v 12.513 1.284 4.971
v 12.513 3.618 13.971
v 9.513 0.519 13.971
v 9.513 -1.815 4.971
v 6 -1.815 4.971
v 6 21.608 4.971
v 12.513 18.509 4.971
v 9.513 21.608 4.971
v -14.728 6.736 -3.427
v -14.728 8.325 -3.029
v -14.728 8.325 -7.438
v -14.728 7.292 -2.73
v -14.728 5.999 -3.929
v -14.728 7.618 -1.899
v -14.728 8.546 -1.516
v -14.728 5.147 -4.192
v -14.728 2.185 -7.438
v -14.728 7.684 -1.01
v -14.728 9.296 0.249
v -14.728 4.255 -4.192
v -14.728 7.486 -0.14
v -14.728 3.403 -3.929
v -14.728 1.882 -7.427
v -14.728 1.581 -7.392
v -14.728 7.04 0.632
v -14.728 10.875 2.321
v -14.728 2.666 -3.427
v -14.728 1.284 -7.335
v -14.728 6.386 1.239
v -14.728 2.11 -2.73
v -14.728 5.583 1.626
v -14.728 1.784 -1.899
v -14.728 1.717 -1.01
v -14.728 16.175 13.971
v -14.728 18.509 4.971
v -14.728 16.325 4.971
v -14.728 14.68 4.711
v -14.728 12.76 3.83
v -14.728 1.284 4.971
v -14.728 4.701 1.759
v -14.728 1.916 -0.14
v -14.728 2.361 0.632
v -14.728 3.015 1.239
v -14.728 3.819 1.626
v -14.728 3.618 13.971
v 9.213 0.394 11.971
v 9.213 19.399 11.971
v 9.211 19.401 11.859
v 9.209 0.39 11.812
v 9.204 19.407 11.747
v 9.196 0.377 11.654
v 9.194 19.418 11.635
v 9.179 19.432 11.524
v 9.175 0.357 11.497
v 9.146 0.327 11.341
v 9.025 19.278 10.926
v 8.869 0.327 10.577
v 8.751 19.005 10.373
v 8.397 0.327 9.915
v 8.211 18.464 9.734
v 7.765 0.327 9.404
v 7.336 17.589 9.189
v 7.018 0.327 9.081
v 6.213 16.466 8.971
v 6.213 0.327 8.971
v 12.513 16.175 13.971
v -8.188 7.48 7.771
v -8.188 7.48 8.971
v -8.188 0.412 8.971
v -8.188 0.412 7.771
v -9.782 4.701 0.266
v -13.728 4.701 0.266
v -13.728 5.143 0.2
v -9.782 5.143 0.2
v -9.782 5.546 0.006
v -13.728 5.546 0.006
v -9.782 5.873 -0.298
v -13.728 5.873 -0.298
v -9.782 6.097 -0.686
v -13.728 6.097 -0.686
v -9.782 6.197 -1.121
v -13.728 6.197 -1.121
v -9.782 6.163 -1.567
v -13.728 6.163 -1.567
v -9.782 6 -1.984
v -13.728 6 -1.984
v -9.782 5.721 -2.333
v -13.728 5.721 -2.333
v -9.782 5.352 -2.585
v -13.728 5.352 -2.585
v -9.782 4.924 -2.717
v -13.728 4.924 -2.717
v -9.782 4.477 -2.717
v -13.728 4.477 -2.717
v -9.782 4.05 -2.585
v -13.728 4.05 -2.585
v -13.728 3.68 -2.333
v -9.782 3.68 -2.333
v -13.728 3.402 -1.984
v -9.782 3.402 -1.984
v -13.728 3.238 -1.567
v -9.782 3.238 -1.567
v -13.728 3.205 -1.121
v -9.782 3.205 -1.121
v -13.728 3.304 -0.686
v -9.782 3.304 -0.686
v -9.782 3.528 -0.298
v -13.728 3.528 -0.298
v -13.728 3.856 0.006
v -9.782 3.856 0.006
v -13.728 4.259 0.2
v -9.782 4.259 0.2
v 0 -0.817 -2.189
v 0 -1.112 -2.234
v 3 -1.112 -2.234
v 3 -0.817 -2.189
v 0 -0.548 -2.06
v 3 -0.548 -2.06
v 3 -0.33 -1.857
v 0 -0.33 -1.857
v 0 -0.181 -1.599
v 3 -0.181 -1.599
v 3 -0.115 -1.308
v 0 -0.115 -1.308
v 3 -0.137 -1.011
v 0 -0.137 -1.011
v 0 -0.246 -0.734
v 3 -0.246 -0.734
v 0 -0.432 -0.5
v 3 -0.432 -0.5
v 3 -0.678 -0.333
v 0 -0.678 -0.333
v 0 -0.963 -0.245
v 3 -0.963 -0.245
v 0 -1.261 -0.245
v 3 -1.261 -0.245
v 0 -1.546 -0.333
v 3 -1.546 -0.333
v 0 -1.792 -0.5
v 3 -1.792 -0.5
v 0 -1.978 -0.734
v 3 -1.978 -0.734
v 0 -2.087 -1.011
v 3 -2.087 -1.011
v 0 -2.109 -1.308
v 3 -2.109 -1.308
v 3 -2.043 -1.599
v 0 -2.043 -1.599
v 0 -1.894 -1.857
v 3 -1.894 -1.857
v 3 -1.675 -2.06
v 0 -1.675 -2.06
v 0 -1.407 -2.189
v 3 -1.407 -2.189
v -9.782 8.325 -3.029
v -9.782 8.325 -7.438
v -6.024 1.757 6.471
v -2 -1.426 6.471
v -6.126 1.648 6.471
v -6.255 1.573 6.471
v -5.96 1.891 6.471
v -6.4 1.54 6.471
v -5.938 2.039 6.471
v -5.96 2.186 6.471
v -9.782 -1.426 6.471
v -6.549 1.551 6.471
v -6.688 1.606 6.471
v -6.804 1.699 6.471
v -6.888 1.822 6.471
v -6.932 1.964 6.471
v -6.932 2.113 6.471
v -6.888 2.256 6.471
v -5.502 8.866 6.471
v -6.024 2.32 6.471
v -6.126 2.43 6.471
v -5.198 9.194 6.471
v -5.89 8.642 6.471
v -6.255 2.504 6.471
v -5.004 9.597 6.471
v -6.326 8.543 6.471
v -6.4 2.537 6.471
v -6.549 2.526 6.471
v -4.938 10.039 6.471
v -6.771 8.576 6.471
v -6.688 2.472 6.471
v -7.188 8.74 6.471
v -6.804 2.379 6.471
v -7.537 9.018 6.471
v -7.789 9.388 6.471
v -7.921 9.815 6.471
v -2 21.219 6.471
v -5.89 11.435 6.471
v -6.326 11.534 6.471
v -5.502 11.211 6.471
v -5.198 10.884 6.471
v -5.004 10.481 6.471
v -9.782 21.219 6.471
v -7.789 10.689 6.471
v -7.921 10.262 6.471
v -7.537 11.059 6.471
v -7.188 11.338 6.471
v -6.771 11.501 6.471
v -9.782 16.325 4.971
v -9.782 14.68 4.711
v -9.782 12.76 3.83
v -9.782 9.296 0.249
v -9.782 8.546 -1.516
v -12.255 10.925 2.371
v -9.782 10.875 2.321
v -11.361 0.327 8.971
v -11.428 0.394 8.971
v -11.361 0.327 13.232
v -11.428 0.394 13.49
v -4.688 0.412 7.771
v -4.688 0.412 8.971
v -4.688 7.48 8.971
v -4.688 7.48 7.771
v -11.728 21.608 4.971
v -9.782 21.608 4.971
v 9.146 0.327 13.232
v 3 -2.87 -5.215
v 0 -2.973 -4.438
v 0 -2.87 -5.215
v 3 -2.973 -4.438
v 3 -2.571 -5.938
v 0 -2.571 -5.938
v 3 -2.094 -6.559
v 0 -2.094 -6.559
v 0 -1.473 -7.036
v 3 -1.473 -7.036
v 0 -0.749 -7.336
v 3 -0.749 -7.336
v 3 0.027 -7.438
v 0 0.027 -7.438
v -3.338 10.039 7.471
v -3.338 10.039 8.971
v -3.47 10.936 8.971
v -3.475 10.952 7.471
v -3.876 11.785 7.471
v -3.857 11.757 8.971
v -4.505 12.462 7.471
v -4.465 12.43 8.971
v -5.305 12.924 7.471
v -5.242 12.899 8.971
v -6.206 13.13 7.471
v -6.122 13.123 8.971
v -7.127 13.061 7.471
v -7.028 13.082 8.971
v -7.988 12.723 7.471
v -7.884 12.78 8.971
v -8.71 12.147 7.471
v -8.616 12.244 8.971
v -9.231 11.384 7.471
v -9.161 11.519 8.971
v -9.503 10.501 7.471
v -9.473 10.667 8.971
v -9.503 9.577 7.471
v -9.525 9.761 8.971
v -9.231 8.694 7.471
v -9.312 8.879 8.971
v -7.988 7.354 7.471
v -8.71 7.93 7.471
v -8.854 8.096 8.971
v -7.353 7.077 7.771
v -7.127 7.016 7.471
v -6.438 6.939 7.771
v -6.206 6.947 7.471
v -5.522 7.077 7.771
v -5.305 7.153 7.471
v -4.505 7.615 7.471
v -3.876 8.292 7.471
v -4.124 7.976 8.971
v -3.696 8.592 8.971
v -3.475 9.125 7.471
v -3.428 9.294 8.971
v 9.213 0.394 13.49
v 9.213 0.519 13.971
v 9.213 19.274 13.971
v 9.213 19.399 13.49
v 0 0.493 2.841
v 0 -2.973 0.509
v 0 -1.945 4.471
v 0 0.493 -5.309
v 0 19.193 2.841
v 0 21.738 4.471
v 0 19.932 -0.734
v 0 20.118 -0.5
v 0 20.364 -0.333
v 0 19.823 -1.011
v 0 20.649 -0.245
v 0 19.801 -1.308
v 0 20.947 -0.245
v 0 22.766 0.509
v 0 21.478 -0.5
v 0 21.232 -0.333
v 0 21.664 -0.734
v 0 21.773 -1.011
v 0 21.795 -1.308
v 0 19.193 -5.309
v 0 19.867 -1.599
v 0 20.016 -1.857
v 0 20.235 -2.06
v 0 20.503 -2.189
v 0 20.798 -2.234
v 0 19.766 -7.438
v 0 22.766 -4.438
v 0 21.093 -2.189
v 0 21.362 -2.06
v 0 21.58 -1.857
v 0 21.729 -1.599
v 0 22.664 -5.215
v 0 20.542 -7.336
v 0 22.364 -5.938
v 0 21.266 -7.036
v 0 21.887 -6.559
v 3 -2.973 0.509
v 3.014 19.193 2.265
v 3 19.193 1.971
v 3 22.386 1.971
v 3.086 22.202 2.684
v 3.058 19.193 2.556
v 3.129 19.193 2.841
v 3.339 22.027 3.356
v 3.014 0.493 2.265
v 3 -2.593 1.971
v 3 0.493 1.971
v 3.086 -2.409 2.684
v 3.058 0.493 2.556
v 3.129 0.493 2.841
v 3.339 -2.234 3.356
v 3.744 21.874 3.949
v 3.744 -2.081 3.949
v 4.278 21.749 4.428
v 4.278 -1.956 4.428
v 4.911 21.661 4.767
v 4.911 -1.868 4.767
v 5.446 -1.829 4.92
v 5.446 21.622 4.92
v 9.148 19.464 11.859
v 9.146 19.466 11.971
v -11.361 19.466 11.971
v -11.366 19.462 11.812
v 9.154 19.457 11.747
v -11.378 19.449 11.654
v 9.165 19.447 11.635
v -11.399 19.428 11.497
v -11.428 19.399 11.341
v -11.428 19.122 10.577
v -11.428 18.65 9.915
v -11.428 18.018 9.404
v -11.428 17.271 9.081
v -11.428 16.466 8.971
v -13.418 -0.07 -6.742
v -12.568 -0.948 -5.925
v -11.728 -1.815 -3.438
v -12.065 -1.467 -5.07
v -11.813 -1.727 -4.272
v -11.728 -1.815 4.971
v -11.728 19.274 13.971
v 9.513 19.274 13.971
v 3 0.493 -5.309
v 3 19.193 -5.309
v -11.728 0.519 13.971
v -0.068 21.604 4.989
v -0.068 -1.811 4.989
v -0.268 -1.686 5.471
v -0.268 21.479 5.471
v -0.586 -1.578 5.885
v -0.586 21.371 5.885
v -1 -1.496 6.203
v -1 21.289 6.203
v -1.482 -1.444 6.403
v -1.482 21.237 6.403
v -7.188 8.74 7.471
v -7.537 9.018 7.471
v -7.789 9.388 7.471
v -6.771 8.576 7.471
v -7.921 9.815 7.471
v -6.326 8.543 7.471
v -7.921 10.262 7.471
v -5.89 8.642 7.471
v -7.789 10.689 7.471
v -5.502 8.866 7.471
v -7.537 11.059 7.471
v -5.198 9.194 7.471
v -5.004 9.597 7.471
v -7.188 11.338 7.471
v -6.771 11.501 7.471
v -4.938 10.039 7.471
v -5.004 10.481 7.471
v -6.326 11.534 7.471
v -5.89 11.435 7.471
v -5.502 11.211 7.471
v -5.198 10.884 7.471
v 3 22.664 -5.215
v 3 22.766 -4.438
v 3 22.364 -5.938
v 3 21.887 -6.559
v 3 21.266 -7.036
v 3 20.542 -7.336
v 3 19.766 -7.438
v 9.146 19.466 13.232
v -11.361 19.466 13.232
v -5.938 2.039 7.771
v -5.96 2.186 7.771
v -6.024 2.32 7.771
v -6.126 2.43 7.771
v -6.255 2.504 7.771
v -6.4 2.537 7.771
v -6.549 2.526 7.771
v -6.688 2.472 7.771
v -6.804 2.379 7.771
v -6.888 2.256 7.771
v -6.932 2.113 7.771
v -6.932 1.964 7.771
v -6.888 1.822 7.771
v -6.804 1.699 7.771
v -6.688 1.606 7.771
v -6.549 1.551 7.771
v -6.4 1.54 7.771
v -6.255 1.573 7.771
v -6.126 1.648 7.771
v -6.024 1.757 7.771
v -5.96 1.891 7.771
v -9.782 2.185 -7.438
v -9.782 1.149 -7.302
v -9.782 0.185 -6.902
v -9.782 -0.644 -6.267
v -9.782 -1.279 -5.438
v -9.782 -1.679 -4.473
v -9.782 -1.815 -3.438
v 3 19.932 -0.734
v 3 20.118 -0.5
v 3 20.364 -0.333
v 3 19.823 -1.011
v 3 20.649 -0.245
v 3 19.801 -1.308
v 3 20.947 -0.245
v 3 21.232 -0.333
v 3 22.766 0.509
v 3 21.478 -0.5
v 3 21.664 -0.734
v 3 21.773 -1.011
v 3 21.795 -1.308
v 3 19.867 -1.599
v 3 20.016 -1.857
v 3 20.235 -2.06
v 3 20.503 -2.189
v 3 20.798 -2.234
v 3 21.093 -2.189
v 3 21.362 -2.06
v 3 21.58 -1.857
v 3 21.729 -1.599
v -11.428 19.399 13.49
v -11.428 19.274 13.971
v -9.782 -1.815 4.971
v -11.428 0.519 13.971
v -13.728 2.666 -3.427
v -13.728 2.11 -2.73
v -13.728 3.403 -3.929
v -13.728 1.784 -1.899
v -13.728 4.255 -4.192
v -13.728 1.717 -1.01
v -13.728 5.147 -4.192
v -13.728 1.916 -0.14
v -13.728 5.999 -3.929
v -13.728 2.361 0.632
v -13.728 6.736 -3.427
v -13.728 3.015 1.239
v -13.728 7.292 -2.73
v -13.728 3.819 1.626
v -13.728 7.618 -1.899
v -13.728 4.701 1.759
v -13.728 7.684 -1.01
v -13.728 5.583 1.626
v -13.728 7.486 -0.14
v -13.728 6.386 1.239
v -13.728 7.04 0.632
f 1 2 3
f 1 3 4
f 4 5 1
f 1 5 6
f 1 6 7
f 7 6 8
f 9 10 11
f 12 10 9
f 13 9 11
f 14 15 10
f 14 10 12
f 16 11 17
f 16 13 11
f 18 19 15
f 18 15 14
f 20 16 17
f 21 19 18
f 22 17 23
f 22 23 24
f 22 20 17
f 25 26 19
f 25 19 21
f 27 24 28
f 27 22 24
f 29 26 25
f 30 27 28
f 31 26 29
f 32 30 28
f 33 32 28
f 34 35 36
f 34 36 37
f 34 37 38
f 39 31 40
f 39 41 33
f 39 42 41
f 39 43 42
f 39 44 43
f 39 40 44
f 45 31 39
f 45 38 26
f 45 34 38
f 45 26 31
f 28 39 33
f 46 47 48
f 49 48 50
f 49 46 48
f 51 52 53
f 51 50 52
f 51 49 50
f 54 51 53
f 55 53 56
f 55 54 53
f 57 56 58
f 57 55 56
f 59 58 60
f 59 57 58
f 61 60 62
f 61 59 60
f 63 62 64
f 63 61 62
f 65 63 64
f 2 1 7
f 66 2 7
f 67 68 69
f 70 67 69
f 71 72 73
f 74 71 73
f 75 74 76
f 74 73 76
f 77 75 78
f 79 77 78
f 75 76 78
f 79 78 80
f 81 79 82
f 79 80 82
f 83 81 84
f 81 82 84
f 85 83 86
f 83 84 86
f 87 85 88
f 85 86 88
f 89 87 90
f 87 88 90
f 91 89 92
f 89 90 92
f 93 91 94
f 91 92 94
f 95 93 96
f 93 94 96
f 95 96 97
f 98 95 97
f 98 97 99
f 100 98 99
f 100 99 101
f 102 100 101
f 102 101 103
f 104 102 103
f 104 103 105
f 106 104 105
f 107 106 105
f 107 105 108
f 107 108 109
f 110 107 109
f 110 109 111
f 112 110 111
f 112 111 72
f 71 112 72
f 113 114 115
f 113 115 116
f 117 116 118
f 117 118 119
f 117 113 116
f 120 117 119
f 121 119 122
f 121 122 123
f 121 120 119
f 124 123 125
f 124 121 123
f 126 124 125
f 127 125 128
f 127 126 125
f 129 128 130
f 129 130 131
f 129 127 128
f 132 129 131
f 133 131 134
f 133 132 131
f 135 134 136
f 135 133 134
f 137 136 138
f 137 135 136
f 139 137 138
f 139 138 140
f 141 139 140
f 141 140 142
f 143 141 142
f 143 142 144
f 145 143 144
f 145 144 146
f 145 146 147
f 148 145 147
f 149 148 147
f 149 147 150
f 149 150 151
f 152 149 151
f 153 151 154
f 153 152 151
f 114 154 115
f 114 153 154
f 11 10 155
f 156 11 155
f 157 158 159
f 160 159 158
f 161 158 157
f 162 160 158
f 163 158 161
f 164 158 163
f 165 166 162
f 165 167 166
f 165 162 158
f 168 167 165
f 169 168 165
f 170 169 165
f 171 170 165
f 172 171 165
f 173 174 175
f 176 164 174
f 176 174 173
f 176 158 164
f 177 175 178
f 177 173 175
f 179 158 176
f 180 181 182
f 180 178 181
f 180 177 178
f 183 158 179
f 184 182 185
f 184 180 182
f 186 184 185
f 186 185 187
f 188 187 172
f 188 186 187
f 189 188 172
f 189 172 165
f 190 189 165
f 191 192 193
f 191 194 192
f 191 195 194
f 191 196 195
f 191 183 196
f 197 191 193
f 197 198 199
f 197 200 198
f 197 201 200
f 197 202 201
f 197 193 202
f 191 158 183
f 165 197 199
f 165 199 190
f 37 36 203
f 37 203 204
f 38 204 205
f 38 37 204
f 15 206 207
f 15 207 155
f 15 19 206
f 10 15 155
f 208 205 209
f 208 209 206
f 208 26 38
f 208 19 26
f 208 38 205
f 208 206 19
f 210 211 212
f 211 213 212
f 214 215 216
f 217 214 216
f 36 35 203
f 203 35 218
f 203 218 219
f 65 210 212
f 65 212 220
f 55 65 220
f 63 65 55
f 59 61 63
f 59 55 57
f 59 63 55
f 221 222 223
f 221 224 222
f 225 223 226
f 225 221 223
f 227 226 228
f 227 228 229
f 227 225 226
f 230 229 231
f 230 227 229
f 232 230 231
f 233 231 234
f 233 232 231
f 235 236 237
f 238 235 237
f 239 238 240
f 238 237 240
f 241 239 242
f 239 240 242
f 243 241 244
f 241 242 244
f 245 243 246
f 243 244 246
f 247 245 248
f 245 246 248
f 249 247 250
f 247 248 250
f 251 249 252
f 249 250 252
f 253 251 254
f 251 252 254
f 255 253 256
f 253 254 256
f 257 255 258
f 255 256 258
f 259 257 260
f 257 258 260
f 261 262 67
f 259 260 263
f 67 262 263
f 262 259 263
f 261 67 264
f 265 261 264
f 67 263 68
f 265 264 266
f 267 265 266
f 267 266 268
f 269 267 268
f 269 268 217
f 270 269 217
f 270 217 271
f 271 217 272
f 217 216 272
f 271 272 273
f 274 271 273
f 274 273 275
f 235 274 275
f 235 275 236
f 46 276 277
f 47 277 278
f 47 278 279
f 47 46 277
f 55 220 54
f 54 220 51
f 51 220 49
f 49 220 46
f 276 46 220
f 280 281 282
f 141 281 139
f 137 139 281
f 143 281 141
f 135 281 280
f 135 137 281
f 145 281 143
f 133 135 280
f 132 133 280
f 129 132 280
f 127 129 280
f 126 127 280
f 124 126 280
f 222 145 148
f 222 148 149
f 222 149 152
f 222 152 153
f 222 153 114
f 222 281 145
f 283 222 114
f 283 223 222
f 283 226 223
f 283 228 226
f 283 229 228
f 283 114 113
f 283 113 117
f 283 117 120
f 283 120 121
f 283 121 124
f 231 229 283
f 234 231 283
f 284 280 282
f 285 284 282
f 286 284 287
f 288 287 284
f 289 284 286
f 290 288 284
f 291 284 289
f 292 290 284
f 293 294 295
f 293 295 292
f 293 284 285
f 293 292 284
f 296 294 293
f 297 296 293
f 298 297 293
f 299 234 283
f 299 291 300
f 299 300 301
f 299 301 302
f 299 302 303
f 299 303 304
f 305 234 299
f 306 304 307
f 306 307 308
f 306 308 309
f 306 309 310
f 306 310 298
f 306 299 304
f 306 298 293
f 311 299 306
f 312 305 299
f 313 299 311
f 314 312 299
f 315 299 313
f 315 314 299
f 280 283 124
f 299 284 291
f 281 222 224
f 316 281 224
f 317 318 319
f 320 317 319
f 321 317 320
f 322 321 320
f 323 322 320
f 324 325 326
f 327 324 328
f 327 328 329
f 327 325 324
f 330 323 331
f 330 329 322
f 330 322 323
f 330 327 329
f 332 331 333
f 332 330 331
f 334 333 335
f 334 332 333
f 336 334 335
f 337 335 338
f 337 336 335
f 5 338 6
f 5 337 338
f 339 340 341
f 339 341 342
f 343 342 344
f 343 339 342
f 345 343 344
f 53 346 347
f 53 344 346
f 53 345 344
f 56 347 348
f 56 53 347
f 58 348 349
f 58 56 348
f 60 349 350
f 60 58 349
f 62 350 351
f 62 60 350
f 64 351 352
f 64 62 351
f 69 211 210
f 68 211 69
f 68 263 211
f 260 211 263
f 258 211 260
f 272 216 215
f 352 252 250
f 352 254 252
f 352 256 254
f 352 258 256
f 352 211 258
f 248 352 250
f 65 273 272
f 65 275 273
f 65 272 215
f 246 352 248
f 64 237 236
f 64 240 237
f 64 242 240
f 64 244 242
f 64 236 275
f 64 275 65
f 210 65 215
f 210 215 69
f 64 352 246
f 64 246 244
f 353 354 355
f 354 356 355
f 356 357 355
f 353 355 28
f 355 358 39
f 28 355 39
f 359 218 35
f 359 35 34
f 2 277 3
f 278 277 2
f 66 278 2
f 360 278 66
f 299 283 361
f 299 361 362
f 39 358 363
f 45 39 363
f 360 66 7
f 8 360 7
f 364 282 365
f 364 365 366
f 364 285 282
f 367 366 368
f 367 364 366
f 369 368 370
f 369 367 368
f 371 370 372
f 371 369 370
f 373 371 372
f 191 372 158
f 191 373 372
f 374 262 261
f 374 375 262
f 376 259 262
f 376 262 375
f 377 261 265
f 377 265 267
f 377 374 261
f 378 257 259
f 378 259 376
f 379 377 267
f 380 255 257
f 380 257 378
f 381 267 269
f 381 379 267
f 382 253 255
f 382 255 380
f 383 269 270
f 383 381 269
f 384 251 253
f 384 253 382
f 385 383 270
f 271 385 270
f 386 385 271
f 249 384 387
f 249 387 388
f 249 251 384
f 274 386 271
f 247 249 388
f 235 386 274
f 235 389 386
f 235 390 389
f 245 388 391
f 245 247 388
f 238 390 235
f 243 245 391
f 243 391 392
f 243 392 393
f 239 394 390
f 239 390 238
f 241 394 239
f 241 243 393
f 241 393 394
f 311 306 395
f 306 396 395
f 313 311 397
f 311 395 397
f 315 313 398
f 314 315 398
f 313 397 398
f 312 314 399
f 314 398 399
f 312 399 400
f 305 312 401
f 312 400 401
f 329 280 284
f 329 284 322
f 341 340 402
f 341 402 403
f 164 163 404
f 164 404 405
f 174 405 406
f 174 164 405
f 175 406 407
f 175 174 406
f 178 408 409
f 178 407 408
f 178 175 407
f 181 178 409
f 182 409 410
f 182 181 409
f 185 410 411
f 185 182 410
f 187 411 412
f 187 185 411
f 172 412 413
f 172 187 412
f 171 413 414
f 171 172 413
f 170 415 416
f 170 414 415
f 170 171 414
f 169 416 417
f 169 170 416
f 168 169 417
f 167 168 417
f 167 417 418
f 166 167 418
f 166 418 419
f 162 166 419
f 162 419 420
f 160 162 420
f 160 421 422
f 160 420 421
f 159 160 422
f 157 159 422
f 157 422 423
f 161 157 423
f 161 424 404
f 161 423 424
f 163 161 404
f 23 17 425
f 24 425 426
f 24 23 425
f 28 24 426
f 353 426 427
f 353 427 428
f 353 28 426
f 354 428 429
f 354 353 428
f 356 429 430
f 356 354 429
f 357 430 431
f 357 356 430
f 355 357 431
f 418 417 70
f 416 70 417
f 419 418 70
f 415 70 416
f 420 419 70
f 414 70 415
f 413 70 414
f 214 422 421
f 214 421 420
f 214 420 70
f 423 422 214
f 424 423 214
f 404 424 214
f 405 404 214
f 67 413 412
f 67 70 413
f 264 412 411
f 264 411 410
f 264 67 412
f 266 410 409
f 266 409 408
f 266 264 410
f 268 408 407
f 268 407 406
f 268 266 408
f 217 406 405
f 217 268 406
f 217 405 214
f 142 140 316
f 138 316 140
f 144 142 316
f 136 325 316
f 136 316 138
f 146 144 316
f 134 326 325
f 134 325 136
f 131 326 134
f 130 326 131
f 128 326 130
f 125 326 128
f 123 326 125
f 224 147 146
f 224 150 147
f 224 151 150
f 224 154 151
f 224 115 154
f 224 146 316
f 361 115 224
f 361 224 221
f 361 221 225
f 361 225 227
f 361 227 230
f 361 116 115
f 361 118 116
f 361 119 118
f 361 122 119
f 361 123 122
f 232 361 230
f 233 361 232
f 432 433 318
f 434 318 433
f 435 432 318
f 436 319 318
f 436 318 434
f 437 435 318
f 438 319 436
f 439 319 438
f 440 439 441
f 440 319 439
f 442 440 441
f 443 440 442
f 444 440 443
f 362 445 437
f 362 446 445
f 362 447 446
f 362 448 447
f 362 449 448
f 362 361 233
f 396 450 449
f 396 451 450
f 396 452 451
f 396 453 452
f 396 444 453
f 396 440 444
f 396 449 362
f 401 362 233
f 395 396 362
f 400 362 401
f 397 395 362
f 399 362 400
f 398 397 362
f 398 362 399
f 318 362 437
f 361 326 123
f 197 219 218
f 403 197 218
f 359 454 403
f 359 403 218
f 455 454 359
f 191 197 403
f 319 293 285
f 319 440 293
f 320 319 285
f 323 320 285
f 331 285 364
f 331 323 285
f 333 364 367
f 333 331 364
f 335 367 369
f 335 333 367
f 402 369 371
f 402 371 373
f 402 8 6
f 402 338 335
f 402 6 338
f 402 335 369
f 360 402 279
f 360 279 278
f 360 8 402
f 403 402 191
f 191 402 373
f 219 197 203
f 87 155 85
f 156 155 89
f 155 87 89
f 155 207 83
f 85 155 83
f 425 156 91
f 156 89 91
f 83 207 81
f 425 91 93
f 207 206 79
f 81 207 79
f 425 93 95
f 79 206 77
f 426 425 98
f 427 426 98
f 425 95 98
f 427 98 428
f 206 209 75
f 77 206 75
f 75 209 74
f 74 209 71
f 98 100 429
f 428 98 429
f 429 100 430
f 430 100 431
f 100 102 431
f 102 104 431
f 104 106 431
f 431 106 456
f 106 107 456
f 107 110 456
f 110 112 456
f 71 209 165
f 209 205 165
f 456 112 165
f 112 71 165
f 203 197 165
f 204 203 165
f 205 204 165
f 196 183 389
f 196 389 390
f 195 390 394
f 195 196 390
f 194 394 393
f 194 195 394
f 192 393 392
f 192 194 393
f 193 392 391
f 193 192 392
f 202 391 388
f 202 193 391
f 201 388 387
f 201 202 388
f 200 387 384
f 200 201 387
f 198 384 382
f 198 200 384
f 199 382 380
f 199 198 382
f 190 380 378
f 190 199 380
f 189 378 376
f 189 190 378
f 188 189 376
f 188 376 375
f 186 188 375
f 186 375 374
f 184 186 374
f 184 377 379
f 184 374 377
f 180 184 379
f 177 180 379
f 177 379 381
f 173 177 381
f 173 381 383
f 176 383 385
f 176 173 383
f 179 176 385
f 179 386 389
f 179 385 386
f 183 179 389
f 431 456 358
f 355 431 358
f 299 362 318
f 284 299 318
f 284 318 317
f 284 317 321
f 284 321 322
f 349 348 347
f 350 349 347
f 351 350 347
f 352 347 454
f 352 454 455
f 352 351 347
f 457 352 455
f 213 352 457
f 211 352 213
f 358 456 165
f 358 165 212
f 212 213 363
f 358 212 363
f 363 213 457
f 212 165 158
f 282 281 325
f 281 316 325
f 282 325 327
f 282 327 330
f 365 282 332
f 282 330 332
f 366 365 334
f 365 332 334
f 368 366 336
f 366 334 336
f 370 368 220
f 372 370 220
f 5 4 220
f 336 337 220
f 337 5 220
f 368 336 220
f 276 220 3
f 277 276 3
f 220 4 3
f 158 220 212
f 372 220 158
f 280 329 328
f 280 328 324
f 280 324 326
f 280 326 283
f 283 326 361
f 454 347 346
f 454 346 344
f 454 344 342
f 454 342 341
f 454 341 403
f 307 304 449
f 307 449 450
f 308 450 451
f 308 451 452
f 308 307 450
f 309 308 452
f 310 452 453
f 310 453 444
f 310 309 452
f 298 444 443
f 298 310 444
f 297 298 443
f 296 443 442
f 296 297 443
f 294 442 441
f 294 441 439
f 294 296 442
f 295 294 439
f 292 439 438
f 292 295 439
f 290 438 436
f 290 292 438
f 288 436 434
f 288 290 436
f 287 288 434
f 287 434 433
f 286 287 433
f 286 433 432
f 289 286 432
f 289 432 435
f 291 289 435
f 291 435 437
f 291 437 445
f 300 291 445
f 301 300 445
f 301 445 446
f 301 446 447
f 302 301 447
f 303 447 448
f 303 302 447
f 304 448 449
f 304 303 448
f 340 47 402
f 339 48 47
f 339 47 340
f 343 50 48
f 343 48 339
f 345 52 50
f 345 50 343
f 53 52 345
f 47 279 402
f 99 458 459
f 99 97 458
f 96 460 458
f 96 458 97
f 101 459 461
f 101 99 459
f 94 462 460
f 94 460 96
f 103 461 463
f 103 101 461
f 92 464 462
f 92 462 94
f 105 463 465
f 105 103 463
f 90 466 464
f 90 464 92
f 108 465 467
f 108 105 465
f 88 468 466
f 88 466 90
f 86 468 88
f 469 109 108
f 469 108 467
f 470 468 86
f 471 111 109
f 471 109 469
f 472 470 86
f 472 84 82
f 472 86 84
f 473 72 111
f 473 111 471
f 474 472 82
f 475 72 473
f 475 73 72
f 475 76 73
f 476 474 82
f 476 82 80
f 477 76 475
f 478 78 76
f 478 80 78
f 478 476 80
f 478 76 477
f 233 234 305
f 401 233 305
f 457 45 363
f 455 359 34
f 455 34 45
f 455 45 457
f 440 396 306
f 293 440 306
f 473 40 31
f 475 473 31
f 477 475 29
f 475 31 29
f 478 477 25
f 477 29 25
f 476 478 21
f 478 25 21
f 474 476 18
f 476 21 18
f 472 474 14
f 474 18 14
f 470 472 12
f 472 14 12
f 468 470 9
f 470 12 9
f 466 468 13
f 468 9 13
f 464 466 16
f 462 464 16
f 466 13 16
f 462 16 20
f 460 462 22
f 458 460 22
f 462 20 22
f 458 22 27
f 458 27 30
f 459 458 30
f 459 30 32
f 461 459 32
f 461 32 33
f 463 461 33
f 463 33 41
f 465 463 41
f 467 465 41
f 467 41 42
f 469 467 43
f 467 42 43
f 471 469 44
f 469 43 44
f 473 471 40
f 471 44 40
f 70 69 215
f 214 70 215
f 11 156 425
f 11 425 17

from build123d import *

# Parameters (mm, degrees)
SKETCH1_W                = 12.409227922
SKETCH1_H                = 25.738488059
SKETCH1_R                = 1
SKETCH1_W_2              = 8.15
SKETCH1_H_2              = 18.7
BOSS_EXTRUDE1_DEPTH      = 3
SKETCH15_W               = 27.240995133
SKETCH15_H               = 25.738488059
BOSS_EXTRUDE5_DEPTH      = 4
SKETCH16_R               = 3.1
CUT_EXTRUDE12_DEPTH      = 1.5
CUT_EXTRUDE13_DEPTH      = 1.2
CHAMFER1_SIZE            = 2
CUT_EXTRUDE14_DEPTH      = 31.943326143
CUT_EXTRUDE14_DEPTH_BACK = 31.943326143
SKETCH18_R               = 1.5
SKETCH18_R_2             = 0.5
FILLET1_R                = 3
FILLET2_R                = 3
BOSS_EXTRUDE7_DEPTH      = 5
CUT_EXTRUDE15_DEPTH      = 39.151604311
CUT_EXTRUDE15_DEPTH_BACK = 39.151604311
CHAMFER2_SIZE            = 3
SKETCH23_R               = 3.318889956
SKETCH23_R_2             = 1.409018686
CUT_EXTRUDE17_DEPTH      = 1
FILLET4_R                = 3
BOSS_EXTRUDE8_DEPTH      = 12.409227923
SKETCH25_R               = 1.5
CUT_EXTRUDE18_DEPTH      = 13
SKETCH26_R               = 2.992034133
CUT_EXTRUDE19_DEPTH      = 1
FILLET5_SIZE             = 8
FILLET6_R                = 4
SKETCH27_W               = 9.781799862
SKETCH27_H               = 23.423713079
CUT_EXTRUDE20_DEPTH      = 1.5
FILLET7_R                = 2


with BuildPart() as part:
    # Sketch1 → Boss-Extrude1 (new body)
    with BuildSketch(Plane(origin=(0, 0, 0), x_dir=(0, 0, -1), z_dir=(1, 0, 0))):
        with Locations((1.233520205, 9.896555647)):
            Rectangle(SKETCH1_W, SKETCH1_H)
        with Locations((1.233520205, 20.798227972)):
            Circle(SKETCH1_R, mode=Mode.SUBTRACT)
        with Locations((1.233520205, -1.111772028)):
            Circle(SKETCH1_R, mode=Mode.SUBTRACT)
        with Locations((1.233520205, 9.843227972)):
            Rectangle(SKETCH1_W_2, SKETCH1_H_2, mode=Mode.SUBTRACT)
    extrude(amount=BOSS_EXTRUDE1_DEPTH)

    # Sketch15 → Boss-Extrude5 (add)
    with BuildSketch(Plane.XY.offset(4.971093756)):
        with Locations((-1.10779903, 9.896555647)):
            Rectangle(SKETCH15_W, SKETCH15_H)
    extrude(amount=BOSS_EXTRUDE5_DEPTH)

    # Sketch16 → Cut-Extrude12 (cut)
    with BuildSketch(Plane.XY.offset(8.971093756)):
        with Locations((-6.437606402, 10.038669905)):
            Circle(SKETCH16_R)
    extrude(amount=-CUT_EXTRUDE12_DEPTH, mode=Mode.SUBTRACT)

    # Sketch17 → Cut-Extrude13 (cut)
    with BuildSketch(Plane.XY.offset(8.971093756)):
        Polygon((-6.437606402, 10.038669905), (-8.187606402, 10.038669905), (-8.187606402, 0.412009525), (-4.687606402, 0.412009525), (-4.687606402, 10.038669905), align=None)
    extrude(amount=-CUT_EXTRUDE13_DEPTH, mode=Mode.SUBTRACT)

    # Chamfer1
    chamfer1_edges = [part.edges().sort_by_distance(p)[0] for p in [
        (-14.728296596, 22.765799677, 6.971093756),
        (-14.728296596, -2.972688382, 6.971093756),
        (12.512698537, -2.972688382, 6.971093756),
        (12.512698537, 22.765799677, 6.971093756),
    ]]
    chamfer(chamfer1_edges, length=CHAMFER1_SIZE)

    # Sketch18 → Cut-Extrude14 (cut, two sides: drawn at the far end of the back side and taken through both)
    with BuildSketch(Plane.XY.offset(7.471093756).offset(-CUT_EXTRUDE14_DEPTH_BACK)):
        with Locations((-6.437606402, 10.038669905)):
            Circle(SKETCH18_R)
        with Locations((-6.437606402, 2.038669905)):
            Circle(SKETCH18_R_2)
    extrude(amount=CUT_EXTRUDE14_DEPTH + CUT_EXTRUDE14_DEPTH_BACK, mode=Mode.SUBTRACT)

    # Fillet1
    fillet1_edges = [part.edges().sort_by_distance(p)[0] for p in [
        (1.5, -2.972688382, -7.438134166),
        (1.5, 22.765799677, -7.438134166),
    ]]
    fillet(fillet1_edges, radius=FILLET1_R)

    # Fillet2
    # the kernel refuses this fillet: 3 mm, written as the material it adds along each edge
    with BuildSketch(Plane(origin=(3, -2.972688382, 4.971093756), x_dir=(0, 0, -1), z_dir=(0, 1, 0))) as fillet2_piece_1_section:
        with BuildLine():
            CenterArc((FILLET2_R, -FILLET2_R), FILLET2_R, 90, 90)
            Line((0, -FILLET2_R), (0, 0))
            Line((0, 0), (FILLET2_R, 0))
        make_face()
    fillet2_piece_1 = extrude(amount=25.738488059, mode=Mode.PRIVATE)
    fillet2_piece_1 = split(fillet2_piece_1, bisect_by=Plane(origin=(3, -2.972688382, 2.841479795), z_dir=(0, 0, -1)), keep=Keep.TOP, mode=Mode.PRIVATE)
    fillet2_piece_1 = split(fillet2_piece_1, bisect_by=Plane(origin=(3, 0.493227972, 4.971093756), z_dir=(0, -1, 0)), keep=Keep.TOP, mode=Mode.PRIVATE)
    add(fillet2_piece_1)
    with BuildSketch(Plane(origin=(3, -2.972688382, 4.971093756), x_dir=(0, 0, -1), z_dir=(0, 1, 0))) as fillet2_piece_2_section:
        with BuildLine():
            CenterArc((FILLET2_R, -FILLET2_R), FILLET2_R, 90, 90)
            Line((0, -FILLET2_R), (0, 0))
            Line((0, 0), (FILLET2_R, 0))
        make_face()
    fillet2_piece_2 = extrude(amount=25.738488059, mode=Mode.PRIVATE)
    fillet2_piece_2 = split(fillet2_piece_2, bisect_by=Plane(origin=(3, -2.972688382, 2.841479795), z_dir=(0, 0, 1)), keep=Keep.TOP, mode=Mode.PRIVATE)
    fillet2_piece_2 = split(fillet2_piece_2, bisect_by=Plane(origin=(3, 0.493227972, 4.971093756), z_dir=(0, -1, 0)), keep=Keep.TOP, mode=Mode.PRIVATE)
    add(fillet2_piece_2)
    with BuildSketch(Plane(origin=(3, -2.972688382, 4.971093756), x_dir=(0, 0, -1), z_dir=(0, 1, 0))) as fillet2_piece_3_section:
        with BuildLine():
            CenterArc((FILLET2_R, -FILLET2_R), FILLET2_R, 90, 90)
            Line((0, -FILLET2_R), (0, 0))
            Line((0, 0), (FILLET2_R, 0))
        make_face()
    fillet2_piece_3 = extrude(amount=25.738488059, mode=Mode.PRIVATE)
    fillet2_piece_3 = split(fillet2_piece_3, bisect_by=Plane(origin=(3, 19.193227972, 4.971093756), z_dir=(0, -1, 0)), keep=Keep.TOP, mode=Mode.PRIVATE)
    fillet2_piece_3 = split(fillet2_piece_3, bisect_by=Plane(origin=(3, -2.972688382, 2.841479795), z_dir=(0, 0, 1)), keep=Keep.TOP, mode=Mode.PRIVATE)
    fillet2_piece_3 = split(fillet2_piece_3, bisect_by=Plane(origin=(3, 0.493227972, 4.971093756), z_dir=(0, 1, 0)), keep=Keep.TOP, mode=Mode.PRIVATE)
    add(fillet2_piece_3)
    with BuildSketch(Plane(origin=(3, -2.972688382, 4.971093756), x_dir=(0, 0, -1), z_dir=(0, 1, 0))) as fillet2_piece_4_section:
        with BuildLine():
            CenterArc((FILLET2_R, -FILLET2_R), FILLET2_R, 90, 90)
            Line((0, -FILLET2_R), (0, 0))
            Line((0, 0), (FILLET2_R, 0))
        make_face()
    fillet2_piece_4 = extrude(amount=25.738488059, mode=Mode.PRIVATE)
    fillet2_piece_4 = split(fillet2_piece_4, bisect_by=Plane(origin=(3, 19.193227972, 4.971093756), z_dir=(0, 1, 0)), keep=Keep.TOP, mode=Mode.PRIVATE)
    fillet2_piece_4 = split(fillet2_piece_4, bisect_by=Plane(origin=(3, -2.972688382, 2.841479795), z_dir=(0, 0, -1)), keep=Keep.TOP, mode=Mode.PRIVATE)
    add(fillet2_piece_4)
    with BuildSketch(Plane(origin=(3, -2.972688382, 4.971093756), x_dir=(0, 0, -1), z_dir=(0, 1, 0))) as fillet2_piece_5_section:
        with BuildLine():
            CenterArc((FILLET2_R, -FILLET2_R), FILLET2_R, 90, 90)
            Line((0, -FILLET2_R), (0, 0))
            Line((0, 0), (FILLET2_R, 0))
        make_face()
    fillet2_piece_5 = extrude(amount=25.738488059, mode=Mode.PRIVATE)
    fillet2_piece_5 = split(fillet2_piece_5, bisect_by=Plane(origin=(3, 19.193227972, 4.971093756), z_dir=(0, 1, 0)), keep=Keep.TOP, mode=Mode.PRIVATE)
    fillet2_piece_5 = split(fillet2_piece_5, bisect_by=Plane(origin=(3, -2.972688382, 2.841479795), z_dir=(0, 0, 1)), keep=Keep.TOP, mode=Mode.PRIVATE)
    add(fillet2_piece_5)

    # Sketch20 → Boss-Extrude7 (add)
    with BuildSketch(Plane.XY.offset(8.971093756)):
        Polygon((-12.728296596, 22.765799677), (-14.728296596, 20.765799677), (-14.728296596, -0.972688382), (-12.728296596, -2.972688382), (10.512698537, -2.972688382), (12.512698537, -0.972688382), (12.512698537, 20.765799677), (10.512698537, 22.765799677), align=None)
        Polygon((9.145793781, 0.327311618), (9.212698537, 0.394216374), (9.212698537, 19.398894921), (9.145793781, 19.465799677), (-11.36139184, 19.465799677), (-11.428296596, 19.398894921), (-11.428296596, 0.394216374), (-11.36139184, 0.327311618), align=None, mode=Mode.SUBTRACT)
    extrude(amount=BOSS_EXTRUDE7_DEPTH)

    # Sketch21 → Cut-Extrude15 (cut, two sides: drawn at the far end of the back side and taken through both)
    with BuildSketch(Plane.ZY.offset(14.728296596).offset(-CUT_EXTRUDE15_DEPTH_BACK)):
        Polygon((0.508600598, 22.765799677), (13.971093756, 19.274181739), (13.971093756, 24.16200456), (0.508600598, 24.16200456), align=None)
        Polygon((0.508600598, -4.368893265), (0.508600598, -2.972688382), (13.971093756, 0.518929556), (13.971093756, -4.368893265), align=None)
    extrude(amount=CUT_EXTRUDE15_DEPTH + CUT_EXTRUDE15_DEPTH_BACK, mode=Mode.SUBTRACT)

    # Chamfer2
    chamfer2_edges = [part.edges().sort_by_distance(p)[0] for p in [
        (-14.728296596, -0.226879413, 11.095507618),
        (12.512698537, 20.019990708, 11.095507618),
        (12.512698537, -0.226879413, 11.095507618),
        (-14.728296596, 20.019990708, 11.095507618),
    ]]
    chamfer(chamfer2_edges, length=CHAMFER2_SIZE)

    # Sketch23 → Cut-Extrude17 (cut)
    with BuildSketch(Plane(origin=(0, 0, 4.971093756), x_dir=(-1, 0, 0), z_dir=(0, 0, -1))):
        with Locations((6.437606402, 10.038669905)):
            Circle(SKETCH23_R)
        with Locations((6.437606402, 2.038669905)):
            Circle(SKETCH23_R_2)
    extrude(amount=-CUT_EXTRUDE17_DEPTH, mode=Mode.SUBTRACT)

    # Fillet4
    # the kernel refuses this fillet: 3 mm, written as the material it adds along each edge
    with BuildSketch(Plane(origin=(9.212698537, -7.105783626, 8.971093756), x_dir=(0, 0, 1), z_dir=(0, 1, 0))) as fillet4_piece_1_section:
        with BuildLine():
            CenterArc((FILLET4_R, -FILLET4_R), FILLET4_R, 90, 90)
            Line((0, -FILLET4_R), (0, 0))
            Line((0, 0), (FILLET4_R, 0))
        make_face()
    fillet4_piece_1 = extrude(amount=34.004678547, mode=Mode.PRIVATE)
    fillet4_piece_1 = split(fillet4_piece_1, bisect_by=Plane(origin=(9.212698537, 19.465799677, 8.971093756), z_dir=(0, -1, 0)), keep=Keep.TOP, mode=Mode.PRIVATE)
    fillet4_piece_1 = split(fillet4_piece_1, bisect_by=Plane(origin=(9.212698537, 0.327311618, 8.971093756), z_dir=(0, 1, 0)), keep=Keep.TOP, mode=Mode.PRIVATE)
    add(fillet4_piece_1)
    with BuildSketch(Plane(origin=(16.645793781, 19.465799677, 8.971093756), x_dir=(0, 0, 1), z_dir=(-1, 0, 0))) as fillet4_piece_2_section:
        with BuildLine():
            CenterArc((FILLET4_R, -FILLET4_R), FILLET4_R, 90, 90)
            Line((0, -FILLET4_R), (0, 0))
            Line((0, 0), (FILLET4_R, 0))
        make_face()
    fillet4_piece_2 = extrude(amount=35.50718562, mode=Mode.PRIVATE)
    fillet4_piece_2 = split(fillet4_piece_2, bisect_by=Plane(origin=(12.895793781, 15.715799677, 8.971093756), z_dir=(-0.707106781186557, -0.7071067811865381, 0)), keep=Keep.TOP, mode=Mode.PRIVATE)
    fillet4_piece_2 = split(fillet4_piece_2, bisect_by=Plane(origin=(-11.428296596, 19.465799677, 8.971093756), z_dir=(1, 0, 0)), keep=Keep.TOP, mode=Mode.PRIVATE)
    add(fillet4_piece_2)

    # Sketch24 → Boss-Extrude8 (add)
    with BuildSketch(Plane(origin=(0, 0, 4.971093756), x_dir=(-1, 0, 0), z_dir=(0, 0, -1))):
        Polygon((14.728296596, 8.32475399), (9.781799862, 8.32475399), (9.781799862, -1.815300892), (11.728296596, -1.815300892), (14.728296596, 1.283957653), align=None)
    extrude(amount=BOSS_EXTRUDE8_DEPTH)

    # Sketch25 → Cut-Extrude18 (cut)
    with BuildSketch(Plane.ZY.offset(14.728296596)):
        with Locations((-1.233520205, 4.70072857)):
            Circle(SKETCH25_R)
    extrude(amount=-CUT_EXTRUDE18_DEPTH, mode=Mode.SUBTRACT)

    # Sketch26 → Cut-Extrude19 (cut)
    with BuildSketch(Plane.ZY.offset(14.728296596)):
        with Locations((-1.233520205, 4.70072857)):
            Circle(SKETCH26_R)
    extrude(amount=-CUT_EXTRUDE19_DEPTH, mode=Mode.SUBTRACT)

    # Fillet5
    # a fillet whose section is not a circle: 8 mm, written as the material it adds along each edge
    with BuildSketch(Plane(origin=(-14.728296596, 8.32475399, 4.971093756), x_dir=(0, 1, 0), z_dir=(1, 0, 0))) as fillet5_piece_1:
        with BuildLine():
            Bezier((FILLET5_SIZE, 0), (0, 0), (0, -FILLET5_SIZE), weights=[1, 0.538461538, 1])
            Line((0, -FILLET5_SIZE), (0, 0))
            Line((0, 0), (FILLET5_SIZE, 0))
        make_face()
    extrude(amount=4.946496733)

    # Fillet6
    fillet6_edges = [part.edges().sort_by_distance(p)[0] for p in [
        (-10.755048229, -1.815300892, -7.438134167),
    ]]
    fillet(fillet6_edges, radius=FILLET6_R)

    # Sketch27 → Cut-Extrude20 (cut)
    with BuildSketch(Plane(origin=(0, 0, 4.971093756), x_dir=(-1, 0, 0), z_dir=(0, 0, -1))):
        with Locations((4.890899931, 9.896555648)):
            Rectangle(SKETCH27_W, SKETCH27_H)
    extrude(amount=-CUT_EXTRUDE20_DEPTH, mode=Mode.SUBTRACT)

    # Fillet7
    fillet7_edges = [part.edges().sort_by_distance(p)[0] for p in [
        (0, 9.896555648, 6.471093756),
    ]]
    fillet(fillet7_edges, radius=FILLET7_R)


solid = part.part
